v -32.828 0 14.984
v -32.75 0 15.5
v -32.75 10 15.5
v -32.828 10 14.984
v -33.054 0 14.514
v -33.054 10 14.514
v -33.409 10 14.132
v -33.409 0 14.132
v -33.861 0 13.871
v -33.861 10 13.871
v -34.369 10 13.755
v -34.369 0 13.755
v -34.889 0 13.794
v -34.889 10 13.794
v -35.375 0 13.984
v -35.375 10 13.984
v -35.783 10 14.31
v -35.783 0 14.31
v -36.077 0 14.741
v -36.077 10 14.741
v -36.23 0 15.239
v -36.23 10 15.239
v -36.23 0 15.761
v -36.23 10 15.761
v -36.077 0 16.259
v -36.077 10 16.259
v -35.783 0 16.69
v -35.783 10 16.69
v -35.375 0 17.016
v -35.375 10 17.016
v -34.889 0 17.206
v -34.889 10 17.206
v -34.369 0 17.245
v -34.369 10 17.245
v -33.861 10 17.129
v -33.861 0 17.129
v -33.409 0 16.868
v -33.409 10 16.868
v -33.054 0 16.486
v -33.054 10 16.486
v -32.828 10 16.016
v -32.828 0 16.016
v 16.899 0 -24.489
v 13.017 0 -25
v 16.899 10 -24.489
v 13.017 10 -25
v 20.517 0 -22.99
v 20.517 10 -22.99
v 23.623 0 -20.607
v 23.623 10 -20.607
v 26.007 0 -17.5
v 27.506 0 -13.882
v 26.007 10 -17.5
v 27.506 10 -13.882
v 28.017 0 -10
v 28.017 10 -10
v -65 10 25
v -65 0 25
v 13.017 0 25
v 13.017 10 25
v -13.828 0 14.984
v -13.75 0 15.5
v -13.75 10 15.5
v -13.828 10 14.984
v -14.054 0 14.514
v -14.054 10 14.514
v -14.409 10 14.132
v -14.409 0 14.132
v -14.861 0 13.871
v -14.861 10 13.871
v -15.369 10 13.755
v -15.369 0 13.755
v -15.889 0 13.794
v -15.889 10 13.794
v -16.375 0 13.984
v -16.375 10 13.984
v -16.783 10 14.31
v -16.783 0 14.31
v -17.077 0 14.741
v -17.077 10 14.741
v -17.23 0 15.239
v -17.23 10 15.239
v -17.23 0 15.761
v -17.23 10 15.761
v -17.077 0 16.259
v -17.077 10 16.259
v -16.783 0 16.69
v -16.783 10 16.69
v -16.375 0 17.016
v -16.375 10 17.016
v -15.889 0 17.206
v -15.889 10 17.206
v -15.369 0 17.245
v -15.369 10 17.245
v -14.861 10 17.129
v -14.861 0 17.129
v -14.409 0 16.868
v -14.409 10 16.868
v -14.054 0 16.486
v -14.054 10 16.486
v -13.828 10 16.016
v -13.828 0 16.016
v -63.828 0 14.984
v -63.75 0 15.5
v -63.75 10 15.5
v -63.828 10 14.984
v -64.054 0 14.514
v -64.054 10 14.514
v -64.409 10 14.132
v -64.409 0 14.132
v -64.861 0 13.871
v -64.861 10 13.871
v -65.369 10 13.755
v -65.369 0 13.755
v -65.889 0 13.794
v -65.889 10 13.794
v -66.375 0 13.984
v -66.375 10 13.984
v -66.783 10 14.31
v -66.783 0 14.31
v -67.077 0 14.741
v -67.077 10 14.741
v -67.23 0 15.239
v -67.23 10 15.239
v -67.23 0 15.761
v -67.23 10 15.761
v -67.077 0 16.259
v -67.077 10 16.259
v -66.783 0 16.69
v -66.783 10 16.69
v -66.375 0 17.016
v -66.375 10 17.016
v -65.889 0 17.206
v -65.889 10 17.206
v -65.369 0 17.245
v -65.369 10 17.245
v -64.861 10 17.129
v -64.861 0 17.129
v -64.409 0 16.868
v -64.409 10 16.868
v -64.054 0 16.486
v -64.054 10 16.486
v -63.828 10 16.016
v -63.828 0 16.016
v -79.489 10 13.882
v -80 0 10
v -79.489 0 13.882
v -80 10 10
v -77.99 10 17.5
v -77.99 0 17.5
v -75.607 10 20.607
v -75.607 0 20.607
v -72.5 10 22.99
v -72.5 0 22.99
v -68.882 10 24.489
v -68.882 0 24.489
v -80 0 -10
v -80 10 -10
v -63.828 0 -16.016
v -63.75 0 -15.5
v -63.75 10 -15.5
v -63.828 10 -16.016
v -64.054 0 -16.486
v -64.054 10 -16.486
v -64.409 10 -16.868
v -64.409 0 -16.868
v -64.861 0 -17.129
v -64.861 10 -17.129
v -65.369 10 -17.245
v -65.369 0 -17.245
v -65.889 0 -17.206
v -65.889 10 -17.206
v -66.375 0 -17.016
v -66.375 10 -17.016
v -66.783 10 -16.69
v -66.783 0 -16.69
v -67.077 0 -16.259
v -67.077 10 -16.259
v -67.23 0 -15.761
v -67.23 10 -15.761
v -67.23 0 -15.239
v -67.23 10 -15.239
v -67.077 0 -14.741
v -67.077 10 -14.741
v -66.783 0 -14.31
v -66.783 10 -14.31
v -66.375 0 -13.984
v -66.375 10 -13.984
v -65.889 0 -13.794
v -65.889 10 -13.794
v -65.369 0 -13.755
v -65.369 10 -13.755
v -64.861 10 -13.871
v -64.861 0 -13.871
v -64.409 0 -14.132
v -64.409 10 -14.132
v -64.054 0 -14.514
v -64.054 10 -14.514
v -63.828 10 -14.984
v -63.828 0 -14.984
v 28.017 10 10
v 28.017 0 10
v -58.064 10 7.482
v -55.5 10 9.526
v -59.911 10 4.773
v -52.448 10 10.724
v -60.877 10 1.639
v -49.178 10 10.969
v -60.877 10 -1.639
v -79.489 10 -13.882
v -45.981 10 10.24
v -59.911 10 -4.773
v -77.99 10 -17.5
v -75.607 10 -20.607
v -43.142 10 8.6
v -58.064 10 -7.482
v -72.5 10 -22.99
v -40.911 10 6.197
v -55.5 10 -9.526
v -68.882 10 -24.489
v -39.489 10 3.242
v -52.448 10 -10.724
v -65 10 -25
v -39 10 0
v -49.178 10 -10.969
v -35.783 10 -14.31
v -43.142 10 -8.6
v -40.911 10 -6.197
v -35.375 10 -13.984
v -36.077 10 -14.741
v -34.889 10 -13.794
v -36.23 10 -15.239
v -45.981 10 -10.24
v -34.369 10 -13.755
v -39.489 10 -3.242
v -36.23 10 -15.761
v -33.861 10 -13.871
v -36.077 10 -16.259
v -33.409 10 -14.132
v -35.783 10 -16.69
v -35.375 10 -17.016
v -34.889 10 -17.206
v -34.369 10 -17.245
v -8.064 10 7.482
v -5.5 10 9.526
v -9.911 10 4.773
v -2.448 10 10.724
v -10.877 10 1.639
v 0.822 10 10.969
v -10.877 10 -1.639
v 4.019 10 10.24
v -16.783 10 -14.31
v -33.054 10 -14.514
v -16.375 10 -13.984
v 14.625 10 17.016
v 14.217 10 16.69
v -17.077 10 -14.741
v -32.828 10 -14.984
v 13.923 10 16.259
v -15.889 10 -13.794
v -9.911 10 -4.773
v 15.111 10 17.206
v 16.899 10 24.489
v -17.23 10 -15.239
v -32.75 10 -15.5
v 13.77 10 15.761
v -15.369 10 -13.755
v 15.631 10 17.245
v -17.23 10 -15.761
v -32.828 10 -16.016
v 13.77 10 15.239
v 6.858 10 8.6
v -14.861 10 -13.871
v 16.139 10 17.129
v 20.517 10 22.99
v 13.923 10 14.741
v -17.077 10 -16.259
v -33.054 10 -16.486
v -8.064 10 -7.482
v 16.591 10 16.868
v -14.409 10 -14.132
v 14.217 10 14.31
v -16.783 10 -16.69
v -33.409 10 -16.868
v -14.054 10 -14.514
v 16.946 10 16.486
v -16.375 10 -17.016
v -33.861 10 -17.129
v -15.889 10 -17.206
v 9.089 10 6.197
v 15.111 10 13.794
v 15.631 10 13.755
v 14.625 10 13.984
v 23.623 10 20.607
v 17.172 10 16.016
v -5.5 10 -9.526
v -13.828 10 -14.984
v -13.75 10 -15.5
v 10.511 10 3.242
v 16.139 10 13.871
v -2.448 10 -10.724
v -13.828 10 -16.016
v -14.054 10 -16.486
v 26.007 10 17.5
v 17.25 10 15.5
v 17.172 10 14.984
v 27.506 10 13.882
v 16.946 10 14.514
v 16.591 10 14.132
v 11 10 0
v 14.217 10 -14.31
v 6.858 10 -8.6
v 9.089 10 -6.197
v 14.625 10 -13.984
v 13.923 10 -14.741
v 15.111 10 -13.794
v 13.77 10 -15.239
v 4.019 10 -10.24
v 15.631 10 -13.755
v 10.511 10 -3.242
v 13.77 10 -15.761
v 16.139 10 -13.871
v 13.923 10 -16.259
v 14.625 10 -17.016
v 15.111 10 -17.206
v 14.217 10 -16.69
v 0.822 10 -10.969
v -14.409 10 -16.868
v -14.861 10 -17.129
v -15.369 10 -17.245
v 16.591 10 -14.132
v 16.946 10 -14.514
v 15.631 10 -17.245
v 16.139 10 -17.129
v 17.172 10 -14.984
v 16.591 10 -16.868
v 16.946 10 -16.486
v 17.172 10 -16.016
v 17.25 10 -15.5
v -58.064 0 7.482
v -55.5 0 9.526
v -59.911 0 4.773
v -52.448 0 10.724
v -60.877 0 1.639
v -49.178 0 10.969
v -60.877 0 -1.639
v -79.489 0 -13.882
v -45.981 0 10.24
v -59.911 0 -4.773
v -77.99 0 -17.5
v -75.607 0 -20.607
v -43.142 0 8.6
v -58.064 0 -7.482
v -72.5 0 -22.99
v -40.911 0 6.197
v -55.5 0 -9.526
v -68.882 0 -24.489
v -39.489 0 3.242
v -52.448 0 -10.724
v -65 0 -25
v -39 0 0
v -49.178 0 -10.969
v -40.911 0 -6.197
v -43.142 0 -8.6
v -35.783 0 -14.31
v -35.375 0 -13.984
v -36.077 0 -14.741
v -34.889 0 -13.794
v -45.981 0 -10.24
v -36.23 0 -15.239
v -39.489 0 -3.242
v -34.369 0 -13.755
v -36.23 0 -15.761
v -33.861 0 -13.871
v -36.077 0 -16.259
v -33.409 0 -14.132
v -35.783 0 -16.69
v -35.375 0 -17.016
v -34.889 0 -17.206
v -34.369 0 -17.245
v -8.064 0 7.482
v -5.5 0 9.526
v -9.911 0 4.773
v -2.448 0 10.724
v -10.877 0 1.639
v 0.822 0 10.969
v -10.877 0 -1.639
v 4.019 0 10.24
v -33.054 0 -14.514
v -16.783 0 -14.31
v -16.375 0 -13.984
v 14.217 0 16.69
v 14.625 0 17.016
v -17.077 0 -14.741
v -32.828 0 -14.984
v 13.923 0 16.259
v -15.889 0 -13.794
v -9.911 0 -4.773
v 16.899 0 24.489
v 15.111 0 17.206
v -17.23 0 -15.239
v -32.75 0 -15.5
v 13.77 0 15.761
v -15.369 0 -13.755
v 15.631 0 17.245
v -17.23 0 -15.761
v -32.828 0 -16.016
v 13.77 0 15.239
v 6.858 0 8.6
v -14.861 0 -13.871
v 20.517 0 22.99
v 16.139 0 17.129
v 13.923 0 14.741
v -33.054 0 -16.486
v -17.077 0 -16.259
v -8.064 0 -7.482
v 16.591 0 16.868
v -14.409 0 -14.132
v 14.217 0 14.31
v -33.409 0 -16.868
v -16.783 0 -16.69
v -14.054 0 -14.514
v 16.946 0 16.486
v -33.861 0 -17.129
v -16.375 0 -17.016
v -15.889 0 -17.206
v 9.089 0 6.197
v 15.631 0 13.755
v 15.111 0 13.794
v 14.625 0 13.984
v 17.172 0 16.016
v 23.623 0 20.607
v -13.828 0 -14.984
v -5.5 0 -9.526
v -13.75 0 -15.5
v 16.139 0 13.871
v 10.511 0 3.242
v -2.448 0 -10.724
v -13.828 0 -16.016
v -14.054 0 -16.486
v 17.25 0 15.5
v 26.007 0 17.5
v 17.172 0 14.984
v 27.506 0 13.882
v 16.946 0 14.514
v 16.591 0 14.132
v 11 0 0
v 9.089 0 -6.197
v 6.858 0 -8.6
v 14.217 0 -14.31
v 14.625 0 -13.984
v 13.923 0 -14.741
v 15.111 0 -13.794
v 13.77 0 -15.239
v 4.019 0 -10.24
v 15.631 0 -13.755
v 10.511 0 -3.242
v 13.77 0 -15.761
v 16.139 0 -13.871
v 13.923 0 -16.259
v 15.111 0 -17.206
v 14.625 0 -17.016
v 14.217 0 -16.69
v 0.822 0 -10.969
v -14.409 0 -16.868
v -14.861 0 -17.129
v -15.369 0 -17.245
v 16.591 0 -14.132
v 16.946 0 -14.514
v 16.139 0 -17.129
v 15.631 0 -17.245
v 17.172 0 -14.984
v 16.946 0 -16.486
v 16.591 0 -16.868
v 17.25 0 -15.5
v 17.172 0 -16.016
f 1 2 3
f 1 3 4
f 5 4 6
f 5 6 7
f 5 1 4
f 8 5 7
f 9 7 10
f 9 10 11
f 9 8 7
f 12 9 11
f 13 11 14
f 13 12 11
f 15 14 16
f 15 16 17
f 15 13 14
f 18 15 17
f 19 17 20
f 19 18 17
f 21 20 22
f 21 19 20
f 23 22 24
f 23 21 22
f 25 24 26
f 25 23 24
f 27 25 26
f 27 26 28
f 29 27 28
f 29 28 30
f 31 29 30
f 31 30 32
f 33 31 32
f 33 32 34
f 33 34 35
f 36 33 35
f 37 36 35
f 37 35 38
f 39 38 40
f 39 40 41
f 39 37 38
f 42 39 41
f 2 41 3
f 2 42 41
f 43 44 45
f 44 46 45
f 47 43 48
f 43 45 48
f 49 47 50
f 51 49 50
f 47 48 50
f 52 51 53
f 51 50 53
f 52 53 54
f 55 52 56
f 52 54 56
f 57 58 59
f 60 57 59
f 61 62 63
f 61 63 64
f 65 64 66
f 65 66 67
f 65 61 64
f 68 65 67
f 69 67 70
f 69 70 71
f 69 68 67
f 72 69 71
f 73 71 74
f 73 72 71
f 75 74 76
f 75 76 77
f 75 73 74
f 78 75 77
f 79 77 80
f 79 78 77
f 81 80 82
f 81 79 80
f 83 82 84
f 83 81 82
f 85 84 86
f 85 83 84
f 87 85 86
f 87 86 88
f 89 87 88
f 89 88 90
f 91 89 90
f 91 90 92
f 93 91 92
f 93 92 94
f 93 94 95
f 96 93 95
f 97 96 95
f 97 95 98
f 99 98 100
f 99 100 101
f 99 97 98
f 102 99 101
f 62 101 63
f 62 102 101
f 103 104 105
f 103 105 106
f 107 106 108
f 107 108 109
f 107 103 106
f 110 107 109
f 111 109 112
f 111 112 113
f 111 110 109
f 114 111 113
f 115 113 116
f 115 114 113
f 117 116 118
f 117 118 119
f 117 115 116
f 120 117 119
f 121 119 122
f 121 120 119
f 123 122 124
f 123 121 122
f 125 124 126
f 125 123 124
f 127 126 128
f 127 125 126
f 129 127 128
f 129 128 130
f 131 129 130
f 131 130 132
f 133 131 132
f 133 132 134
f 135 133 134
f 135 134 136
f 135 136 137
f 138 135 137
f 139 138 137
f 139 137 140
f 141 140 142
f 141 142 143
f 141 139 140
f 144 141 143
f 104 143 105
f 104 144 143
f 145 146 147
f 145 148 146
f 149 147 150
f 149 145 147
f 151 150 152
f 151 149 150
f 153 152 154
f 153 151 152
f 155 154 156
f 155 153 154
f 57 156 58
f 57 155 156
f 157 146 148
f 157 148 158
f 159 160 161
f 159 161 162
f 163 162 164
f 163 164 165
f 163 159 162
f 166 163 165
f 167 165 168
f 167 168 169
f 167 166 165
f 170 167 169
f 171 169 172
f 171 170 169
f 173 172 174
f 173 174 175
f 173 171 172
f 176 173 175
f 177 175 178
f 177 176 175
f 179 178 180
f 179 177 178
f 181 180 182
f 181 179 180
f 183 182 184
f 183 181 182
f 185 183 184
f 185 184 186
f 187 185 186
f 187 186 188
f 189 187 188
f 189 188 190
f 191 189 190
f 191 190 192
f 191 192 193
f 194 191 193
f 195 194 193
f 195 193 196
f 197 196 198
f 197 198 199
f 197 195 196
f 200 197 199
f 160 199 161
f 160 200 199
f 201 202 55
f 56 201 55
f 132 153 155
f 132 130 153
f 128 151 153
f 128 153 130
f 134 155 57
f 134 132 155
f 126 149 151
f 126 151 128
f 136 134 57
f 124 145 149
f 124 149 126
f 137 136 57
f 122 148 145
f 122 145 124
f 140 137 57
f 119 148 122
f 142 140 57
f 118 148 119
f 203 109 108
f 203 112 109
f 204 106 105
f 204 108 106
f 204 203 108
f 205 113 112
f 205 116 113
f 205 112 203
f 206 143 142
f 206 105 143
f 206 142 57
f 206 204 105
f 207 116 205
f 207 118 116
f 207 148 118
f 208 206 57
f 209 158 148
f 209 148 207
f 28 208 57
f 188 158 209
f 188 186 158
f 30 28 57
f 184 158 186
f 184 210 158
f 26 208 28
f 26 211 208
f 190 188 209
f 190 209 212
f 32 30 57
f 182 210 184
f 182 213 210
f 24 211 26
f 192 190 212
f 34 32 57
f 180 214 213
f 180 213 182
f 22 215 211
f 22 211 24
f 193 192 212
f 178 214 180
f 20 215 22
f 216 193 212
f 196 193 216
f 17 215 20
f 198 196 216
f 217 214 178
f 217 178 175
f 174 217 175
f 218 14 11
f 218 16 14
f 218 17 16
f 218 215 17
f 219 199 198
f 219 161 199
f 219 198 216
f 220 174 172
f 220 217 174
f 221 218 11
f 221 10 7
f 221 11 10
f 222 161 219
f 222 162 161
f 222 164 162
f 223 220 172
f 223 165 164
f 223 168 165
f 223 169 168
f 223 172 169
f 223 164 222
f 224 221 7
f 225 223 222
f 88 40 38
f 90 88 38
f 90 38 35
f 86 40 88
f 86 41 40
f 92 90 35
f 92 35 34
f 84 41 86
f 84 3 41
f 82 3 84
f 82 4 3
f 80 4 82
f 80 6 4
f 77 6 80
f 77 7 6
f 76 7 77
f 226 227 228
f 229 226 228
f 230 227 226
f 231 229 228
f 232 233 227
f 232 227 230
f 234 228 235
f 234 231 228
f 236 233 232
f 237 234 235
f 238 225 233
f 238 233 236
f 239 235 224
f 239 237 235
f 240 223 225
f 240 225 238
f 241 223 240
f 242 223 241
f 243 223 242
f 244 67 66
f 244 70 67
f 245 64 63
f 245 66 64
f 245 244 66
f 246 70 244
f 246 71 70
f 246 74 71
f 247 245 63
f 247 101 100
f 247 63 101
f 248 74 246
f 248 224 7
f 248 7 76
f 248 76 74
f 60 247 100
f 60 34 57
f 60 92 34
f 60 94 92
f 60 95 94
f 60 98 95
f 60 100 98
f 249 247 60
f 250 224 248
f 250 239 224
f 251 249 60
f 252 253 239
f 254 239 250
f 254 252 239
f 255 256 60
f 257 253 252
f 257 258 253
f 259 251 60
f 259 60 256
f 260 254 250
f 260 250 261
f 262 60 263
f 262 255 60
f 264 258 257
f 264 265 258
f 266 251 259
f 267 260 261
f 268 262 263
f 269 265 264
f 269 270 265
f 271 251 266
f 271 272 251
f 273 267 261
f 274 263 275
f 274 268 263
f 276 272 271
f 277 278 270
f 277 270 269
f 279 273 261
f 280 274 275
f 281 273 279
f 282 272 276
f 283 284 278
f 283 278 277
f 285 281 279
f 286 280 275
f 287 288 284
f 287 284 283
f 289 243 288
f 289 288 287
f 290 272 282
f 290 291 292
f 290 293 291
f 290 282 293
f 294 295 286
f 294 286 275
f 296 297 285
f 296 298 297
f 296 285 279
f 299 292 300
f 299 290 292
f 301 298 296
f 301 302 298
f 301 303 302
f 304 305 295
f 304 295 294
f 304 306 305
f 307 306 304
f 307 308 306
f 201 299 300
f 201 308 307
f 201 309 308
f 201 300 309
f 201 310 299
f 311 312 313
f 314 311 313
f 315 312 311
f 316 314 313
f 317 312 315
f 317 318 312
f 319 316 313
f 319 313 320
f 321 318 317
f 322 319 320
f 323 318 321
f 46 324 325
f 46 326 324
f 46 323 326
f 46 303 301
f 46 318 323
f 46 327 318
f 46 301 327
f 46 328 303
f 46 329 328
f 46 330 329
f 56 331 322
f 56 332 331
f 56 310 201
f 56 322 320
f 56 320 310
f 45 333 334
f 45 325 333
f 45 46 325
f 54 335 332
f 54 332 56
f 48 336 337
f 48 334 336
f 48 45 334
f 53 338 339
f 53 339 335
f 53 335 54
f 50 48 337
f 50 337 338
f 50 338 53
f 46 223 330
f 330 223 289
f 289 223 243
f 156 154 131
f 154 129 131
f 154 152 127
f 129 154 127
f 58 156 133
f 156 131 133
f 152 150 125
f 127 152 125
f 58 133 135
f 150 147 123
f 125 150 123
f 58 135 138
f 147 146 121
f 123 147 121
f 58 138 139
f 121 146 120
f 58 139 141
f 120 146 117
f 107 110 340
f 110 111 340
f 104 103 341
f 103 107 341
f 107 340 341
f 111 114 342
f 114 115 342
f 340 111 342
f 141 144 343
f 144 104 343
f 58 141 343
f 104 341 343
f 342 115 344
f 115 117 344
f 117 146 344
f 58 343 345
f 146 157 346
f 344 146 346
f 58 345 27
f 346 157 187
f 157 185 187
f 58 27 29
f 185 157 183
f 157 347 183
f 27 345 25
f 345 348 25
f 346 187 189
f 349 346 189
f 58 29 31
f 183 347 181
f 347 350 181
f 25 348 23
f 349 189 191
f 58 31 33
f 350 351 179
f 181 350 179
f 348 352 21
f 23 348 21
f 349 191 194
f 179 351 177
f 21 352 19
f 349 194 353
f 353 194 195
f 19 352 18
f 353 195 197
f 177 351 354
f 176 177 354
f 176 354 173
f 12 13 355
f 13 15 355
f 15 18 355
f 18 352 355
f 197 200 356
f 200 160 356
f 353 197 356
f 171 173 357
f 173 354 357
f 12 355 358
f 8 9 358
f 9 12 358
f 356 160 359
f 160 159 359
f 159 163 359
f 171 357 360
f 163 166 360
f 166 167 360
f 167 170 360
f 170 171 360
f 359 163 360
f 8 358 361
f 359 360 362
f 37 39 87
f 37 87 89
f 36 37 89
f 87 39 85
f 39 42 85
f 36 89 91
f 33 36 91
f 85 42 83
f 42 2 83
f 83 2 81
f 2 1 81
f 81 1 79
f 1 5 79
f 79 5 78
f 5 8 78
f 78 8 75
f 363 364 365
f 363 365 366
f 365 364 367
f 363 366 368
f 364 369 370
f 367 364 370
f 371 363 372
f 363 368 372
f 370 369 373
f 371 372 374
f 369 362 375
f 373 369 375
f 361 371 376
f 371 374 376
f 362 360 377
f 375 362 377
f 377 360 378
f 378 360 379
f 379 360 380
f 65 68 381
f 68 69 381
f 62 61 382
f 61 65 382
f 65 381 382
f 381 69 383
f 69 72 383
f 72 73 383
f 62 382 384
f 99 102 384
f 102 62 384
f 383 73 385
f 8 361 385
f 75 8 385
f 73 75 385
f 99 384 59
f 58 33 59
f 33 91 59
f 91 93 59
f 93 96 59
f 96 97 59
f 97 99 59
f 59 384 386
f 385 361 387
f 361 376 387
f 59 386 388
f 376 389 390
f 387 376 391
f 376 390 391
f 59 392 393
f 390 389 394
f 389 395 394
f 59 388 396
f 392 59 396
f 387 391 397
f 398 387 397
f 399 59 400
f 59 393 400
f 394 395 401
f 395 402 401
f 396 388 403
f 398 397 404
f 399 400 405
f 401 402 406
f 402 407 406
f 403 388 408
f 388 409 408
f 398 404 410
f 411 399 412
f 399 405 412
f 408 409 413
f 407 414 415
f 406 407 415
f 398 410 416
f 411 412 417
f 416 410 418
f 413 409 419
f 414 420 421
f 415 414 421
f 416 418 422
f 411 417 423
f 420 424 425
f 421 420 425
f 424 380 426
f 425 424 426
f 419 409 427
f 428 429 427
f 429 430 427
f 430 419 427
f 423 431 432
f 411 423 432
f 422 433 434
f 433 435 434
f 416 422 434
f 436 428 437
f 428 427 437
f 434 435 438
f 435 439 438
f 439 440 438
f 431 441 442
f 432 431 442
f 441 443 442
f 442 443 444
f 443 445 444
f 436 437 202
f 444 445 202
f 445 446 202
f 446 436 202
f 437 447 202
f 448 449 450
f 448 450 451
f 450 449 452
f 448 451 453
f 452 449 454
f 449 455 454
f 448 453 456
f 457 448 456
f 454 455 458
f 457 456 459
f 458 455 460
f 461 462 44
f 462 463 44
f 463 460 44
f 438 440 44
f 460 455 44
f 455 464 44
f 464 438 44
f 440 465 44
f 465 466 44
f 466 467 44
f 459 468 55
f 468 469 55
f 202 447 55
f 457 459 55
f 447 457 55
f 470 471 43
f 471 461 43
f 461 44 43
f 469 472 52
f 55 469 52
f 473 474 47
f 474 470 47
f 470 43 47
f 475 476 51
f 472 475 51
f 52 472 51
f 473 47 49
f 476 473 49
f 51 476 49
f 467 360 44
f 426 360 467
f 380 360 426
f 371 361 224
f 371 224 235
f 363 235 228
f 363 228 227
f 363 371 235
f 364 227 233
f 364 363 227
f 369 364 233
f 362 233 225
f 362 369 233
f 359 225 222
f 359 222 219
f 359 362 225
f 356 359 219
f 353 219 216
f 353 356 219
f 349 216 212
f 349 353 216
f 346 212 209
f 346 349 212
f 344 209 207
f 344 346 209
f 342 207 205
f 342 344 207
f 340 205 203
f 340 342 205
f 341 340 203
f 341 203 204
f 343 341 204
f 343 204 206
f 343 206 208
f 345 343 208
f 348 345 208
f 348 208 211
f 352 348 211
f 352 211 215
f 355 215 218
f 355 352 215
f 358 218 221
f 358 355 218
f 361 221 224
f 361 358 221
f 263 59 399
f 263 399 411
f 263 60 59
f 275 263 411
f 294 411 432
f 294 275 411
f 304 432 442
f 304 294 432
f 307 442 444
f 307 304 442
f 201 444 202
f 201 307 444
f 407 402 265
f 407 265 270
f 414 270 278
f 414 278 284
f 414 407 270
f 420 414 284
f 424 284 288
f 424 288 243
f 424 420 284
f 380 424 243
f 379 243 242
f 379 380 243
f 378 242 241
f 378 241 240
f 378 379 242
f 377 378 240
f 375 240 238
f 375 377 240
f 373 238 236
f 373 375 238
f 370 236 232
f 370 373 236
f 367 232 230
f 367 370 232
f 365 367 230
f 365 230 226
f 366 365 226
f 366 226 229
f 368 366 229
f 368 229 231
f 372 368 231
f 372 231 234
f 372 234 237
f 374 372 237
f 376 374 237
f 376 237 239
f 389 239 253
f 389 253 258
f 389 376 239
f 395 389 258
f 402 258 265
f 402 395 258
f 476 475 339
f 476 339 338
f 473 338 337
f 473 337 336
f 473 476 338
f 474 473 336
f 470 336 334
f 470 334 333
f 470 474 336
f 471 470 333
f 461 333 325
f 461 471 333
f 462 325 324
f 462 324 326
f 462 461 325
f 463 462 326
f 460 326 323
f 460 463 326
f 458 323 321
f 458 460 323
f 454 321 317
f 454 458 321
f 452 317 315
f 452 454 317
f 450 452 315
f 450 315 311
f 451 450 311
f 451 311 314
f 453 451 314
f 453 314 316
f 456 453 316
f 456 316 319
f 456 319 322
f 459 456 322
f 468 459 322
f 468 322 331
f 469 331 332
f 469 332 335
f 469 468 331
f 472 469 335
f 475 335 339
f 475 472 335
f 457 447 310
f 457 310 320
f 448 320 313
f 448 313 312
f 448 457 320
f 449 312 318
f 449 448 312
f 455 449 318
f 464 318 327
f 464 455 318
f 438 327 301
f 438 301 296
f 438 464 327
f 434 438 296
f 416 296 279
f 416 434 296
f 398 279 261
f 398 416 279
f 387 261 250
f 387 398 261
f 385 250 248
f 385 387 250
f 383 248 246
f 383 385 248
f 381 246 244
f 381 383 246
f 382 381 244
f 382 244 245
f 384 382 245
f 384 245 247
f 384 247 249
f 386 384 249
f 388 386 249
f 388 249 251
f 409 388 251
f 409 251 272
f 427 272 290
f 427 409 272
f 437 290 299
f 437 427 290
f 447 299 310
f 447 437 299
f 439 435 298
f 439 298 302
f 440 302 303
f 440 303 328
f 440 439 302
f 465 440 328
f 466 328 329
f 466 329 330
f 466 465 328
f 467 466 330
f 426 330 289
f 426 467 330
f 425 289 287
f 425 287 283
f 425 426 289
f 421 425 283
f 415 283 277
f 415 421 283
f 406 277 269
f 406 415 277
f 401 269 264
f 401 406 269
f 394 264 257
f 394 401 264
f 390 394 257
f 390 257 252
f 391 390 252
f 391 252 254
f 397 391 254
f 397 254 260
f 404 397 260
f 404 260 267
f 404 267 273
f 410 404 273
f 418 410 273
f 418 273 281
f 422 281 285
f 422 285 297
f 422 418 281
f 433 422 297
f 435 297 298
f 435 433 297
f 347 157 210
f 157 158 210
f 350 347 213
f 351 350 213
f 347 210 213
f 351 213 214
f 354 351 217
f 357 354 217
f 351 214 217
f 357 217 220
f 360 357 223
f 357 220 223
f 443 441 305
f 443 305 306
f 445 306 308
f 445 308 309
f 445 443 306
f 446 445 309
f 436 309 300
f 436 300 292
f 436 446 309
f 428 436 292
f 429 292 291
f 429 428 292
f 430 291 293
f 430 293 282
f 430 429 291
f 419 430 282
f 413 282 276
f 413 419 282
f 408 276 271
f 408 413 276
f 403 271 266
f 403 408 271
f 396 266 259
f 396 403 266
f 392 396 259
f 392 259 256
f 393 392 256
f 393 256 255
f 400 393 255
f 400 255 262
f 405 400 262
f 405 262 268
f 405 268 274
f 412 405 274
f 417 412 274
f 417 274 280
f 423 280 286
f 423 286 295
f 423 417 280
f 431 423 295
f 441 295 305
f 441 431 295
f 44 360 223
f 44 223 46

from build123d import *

# Parameters (mm, degrees)
SKETCH1_W           = 108.016753786
SKETCH1_H           = 50
SKETCH1_R           = 11
SKETCH1_R_2         = 1.75
BOSS_EXTRUDE1_DEPTH = 10
FILLET1_R           = 15


with BuildPart() as part:
    # Sketch1 → Boss-Extrude1 (new body)
    with BuildSketch(Plane(origin=(0, 0, 0), x_dir=(1, 0, 0), z_dir=(0, 1, 0))):
        with Locations((-25.991623107, 0)):
            Rectangle(SKETCH1_W, SKETCH1_H)
        Circle(SKETCH1_R, mode=Mode.SUBTRACT)
        with Locations((15.5, 15.5)):
            Circle(SKETCH1_R_2, mode=Mode.SUBTRACT)
        with Locations((-15.5, 15.5)):
            Circle(SKETCH1_R_2, mode=Mode.SUBTRACT)
        with Locations((-15.5, -15.5)):
            Circle(SKETCH1_R_2, mode=Mode.SUBTRACT)
        with Locations((15.5, -15.5)):
            Circle(SKETCH1_R_2, mode=Mode.SUBTRACT)
        with Locations((-65.5, 15.5)):
            Circle(SKETCH1_R_2, mode=Mode.SUBTRACT)
        with Locations((-34.5, 15.5)):
            Circle(SKETCH1_R_2, mode=Mode.SUBTRACT)
        with Locations((-34.5, -15.5)):
            Circle(SKETCH1_R_2, mode=Mode.SUBTRACT)
        with Locations((-65.5, -15.5)):
            Circle(SKETCH1_R_2, mode=Mode.SUBTRACT)
        with Locations((-50, 0)):
            Circle(SKETCH1_R, mode=Mode.SUBTRACT)
    extrude(amount=BOSS_EXTRUDE1_DEPTH)

    # Fillet1
    fillet1_edges = [part.edges().sort_by_distance(p)[0] for p in [
        (-80, 5, -25),
        (28.016753786, 5, -25),
        (28.016753786, 5, 25),
        (-80, 5, 25),
    ]]
    fillet(fillet1_edges, radius=FILLET1_R)


solid = part.part
